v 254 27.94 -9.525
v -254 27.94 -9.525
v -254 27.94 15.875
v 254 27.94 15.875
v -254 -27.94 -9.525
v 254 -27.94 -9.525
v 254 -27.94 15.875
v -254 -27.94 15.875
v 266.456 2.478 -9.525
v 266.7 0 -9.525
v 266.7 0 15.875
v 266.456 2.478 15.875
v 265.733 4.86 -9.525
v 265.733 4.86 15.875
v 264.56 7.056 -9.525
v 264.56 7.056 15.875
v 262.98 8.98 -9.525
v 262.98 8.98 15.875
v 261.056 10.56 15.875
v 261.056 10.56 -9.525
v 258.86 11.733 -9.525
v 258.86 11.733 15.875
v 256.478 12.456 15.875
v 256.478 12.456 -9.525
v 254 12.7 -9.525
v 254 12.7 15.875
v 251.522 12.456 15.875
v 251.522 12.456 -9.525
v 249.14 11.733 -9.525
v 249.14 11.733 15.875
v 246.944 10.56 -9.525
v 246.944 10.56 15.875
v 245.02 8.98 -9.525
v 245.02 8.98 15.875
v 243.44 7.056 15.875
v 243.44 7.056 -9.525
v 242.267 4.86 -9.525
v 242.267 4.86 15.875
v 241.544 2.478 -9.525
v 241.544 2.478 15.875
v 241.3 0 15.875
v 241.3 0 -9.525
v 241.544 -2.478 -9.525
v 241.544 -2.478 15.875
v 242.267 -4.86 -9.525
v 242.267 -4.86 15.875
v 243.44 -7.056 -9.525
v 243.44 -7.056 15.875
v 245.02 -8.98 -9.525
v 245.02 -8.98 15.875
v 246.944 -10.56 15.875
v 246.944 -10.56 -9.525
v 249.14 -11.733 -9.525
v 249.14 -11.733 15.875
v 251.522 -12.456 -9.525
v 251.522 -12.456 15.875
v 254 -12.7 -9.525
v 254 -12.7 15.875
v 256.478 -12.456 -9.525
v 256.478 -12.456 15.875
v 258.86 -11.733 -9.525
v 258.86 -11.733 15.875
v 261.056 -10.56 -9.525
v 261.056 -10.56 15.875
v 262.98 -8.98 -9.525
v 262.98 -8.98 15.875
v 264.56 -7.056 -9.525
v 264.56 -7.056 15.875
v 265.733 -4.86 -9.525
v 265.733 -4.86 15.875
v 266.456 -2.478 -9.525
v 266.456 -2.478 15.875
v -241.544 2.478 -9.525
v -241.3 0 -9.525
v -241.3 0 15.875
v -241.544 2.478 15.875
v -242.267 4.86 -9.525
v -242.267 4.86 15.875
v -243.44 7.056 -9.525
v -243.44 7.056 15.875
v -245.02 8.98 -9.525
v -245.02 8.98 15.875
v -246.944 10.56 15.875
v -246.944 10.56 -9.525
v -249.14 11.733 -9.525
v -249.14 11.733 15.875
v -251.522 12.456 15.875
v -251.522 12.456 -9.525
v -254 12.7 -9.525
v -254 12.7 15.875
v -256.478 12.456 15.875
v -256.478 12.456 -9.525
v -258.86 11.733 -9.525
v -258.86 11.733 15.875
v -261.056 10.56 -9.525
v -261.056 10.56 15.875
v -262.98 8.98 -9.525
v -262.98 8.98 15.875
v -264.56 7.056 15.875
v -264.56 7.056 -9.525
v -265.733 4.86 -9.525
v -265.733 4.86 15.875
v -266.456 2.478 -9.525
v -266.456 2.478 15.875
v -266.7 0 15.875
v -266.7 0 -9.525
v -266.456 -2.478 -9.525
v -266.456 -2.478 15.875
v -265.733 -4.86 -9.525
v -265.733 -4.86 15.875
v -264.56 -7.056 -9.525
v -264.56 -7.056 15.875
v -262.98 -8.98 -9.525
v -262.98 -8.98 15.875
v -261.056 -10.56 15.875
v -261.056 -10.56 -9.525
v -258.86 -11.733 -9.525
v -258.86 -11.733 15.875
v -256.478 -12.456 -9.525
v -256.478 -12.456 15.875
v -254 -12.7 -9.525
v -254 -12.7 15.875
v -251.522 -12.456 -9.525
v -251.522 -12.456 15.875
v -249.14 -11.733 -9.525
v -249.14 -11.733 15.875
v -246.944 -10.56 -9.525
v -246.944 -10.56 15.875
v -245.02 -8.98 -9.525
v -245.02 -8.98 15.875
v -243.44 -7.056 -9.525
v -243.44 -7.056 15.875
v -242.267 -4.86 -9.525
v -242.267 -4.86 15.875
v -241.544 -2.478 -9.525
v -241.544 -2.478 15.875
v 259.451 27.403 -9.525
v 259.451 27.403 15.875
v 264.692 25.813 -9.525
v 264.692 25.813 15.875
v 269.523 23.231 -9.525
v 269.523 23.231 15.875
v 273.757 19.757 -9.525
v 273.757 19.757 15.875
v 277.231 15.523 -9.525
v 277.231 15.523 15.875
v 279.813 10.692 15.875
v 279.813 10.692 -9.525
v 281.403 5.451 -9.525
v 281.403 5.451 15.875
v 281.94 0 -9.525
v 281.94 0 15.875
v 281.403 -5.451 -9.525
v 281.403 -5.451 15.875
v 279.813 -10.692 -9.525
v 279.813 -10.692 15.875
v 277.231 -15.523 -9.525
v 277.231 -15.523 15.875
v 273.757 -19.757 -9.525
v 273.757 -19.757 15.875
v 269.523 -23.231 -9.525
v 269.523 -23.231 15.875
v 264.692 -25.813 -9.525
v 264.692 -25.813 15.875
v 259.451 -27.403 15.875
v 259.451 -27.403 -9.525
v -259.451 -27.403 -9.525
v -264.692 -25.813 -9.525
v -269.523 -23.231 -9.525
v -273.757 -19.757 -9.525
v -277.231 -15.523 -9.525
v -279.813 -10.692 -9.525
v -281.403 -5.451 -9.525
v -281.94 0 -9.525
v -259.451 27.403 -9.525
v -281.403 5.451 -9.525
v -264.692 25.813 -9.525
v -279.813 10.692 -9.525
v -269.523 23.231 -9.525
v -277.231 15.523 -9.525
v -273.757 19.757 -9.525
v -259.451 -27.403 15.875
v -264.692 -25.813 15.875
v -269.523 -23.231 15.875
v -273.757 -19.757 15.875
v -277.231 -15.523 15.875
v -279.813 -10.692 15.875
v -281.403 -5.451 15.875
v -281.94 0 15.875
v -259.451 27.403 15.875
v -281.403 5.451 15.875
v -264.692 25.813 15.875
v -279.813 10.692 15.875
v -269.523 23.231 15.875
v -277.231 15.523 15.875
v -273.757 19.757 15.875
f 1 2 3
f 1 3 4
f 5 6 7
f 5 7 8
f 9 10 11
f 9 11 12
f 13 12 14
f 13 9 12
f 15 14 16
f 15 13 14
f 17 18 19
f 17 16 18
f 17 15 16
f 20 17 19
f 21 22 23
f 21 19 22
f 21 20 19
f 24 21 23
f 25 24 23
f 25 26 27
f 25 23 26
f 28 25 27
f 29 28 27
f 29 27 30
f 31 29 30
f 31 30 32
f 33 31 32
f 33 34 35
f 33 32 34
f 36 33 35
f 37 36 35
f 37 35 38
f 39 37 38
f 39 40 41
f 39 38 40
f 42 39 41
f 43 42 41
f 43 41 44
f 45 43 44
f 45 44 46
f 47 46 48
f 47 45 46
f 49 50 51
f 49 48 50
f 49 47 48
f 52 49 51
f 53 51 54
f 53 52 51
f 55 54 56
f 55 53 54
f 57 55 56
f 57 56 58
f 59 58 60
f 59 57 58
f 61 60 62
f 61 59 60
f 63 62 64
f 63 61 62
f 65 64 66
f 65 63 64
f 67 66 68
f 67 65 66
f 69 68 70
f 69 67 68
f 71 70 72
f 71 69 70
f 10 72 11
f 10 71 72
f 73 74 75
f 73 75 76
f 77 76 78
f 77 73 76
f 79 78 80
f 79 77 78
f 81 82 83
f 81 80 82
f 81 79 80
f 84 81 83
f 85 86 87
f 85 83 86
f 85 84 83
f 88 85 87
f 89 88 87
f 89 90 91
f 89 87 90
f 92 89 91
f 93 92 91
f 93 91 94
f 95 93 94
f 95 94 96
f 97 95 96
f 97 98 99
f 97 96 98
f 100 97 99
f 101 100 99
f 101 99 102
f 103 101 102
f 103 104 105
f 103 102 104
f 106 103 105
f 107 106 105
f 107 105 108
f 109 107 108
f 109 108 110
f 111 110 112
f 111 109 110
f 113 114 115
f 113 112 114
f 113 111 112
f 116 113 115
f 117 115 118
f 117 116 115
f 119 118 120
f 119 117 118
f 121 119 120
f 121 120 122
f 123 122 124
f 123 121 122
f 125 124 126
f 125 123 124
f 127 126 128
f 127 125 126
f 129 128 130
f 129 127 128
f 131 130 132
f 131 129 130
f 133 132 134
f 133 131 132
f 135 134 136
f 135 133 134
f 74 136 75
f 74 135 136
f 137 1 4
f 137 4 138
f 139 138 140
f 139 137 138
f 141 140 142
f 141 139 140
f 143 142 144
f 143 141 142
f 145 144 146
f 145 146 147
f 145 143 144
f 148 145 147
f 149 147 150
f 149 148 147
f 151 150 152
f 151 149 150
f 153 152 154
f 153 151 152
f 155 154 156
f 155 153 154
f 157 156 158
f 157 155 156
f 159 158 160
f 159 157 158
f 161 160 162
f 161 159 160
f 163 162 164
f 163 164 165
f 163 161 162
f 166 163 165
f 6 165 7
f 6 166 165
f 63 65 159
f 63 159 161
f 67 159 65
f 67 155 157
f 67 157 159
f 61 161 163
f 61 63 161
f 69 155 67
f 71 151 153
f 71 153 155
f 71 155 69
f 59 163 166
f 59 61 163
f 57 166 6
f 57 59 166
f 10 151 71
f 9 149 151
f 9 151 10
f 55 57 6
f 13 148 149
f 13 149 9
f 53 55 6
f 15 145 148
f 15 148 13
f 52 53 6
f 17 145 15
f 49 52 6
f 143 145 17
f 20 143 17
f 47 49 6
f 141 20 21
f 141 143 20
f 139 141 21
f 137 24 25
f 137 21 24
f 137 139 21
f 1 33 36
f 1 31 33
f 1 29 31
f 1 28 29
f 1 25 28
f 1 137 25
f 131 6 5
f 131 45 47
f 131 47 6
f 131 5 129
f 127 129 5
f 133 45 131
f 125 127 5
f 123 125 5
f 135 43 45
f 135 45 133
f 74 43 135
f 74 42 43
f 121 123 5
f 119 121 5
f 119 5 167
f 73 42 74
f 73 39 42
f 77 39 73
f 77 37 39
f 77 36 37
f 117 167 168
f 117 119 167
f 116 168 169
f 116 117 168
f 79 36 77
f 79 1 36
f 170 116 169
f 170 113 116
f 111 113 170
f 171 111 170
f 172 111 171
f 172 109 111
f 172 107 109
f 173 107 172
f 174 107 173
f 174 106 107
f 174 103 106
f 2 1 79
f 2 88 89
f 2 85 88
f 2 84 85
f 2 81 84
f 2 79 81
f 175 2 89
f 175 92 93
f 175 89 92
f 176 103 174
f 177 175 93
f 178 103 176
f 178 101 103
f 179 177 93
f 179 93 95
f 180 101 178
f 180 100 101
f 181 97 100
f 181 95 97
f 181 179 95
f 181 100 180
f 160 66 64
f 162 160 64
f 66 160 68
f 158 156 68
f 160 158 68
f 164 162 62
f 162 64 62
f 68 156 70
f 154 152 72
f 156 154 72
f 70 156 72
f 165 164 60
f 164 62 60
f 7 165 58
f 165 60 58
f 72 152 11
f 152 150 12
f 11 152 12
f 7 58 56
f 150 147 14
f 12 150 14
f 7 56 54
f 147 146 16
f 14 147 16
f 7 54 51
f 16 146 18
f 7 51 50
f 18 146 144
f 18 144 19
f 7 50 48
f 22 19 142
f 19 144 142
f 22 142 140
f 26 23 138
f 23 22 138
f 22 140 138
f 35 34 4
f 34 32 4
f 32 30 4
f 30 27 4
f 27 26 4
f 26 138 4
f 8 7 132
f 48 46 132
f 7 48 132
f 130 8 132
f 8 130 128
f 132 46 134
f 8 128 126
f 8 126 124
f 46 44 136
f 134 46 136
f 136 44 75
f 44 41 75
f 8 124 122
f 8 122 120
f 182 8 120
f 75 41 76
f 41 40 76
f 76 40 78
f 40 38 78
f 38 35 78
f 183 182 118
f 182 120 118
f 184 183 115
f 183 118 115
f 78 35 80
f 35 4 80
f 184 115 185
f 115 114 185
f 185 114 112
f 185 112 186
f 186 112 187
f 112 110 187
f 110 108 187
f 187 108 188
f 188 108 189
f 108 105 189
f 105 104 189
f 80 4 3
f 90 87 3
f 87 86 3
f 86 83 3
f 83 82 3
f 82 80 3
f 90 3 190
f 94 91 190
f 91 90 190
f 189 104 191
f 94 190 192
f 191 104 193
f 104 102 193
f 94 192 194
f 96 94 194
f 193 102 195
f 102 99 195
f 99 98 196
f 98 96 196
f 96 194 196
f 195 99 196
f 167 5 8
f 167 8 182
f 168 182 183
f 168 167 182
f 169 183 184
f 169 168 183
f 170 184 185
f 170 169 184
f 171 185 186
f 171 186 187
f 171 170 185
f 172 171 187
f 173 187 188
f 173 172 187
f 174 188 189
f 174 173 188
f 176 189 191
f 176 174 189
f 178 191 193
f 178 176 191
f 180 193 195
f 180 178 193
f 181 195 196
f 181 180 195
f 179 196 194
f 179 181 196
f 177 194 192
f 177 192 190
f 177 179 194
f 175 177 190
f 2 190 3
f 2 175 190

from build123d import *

# Parameters (mm, degrees)
BOSS_EXTRUDE1_DEPTH     = 6.35
CUT_EXTRUDE1_DEPTH      = 72.114330131
CUT_EXTRUDE1_DEPTH_BACK = 72.114330131
SKETCH2_R               = 3.175
SCALE1_SCALE            = 4


with BuildPart() as part:
    # Sketch1 → Boss-Extrude1 (new body)
    with BuildSketch(Plane.XY):
        with BuildLine():
            Line((-63.5, 6.985), (63.5, 6.985))
            ThreePointArc((63.5, 6.985), (70.485, 0), (63.5, -6.985))
            Line((63.5, -6.985), (-63.5, -6.985))
            ThreePointArc((-63.5, -6.985), (-70.485, 0), (-63.5, 6.985))
        make_face()
    extrude(amount=BOSS_EXTRUDE1_DEPTH)

    # Sketch2 → Cut-Extrude1 (cut, two sides: drawn at the far end of the back side and taken through both)
    with BuildSketch(Plane.XY.offset(6.35).offset(-CUT_EXTRUDE1_DEPTH_BACK)):
        with Locations((63.5, 0)):
            Circle(SKETCH2_R)
        with Locations((-63.5, 0)):
            Circle(SKETCH2_R)
    extrude(amount=CUT_EXTRUDE1_DEPTH + CUT_EXTRUDE1_DEPTH_BACK, mode=Mode.SUBTRACT)


with BuildPart() as part_1:
    # Scale1: scaled about (0, 0, 3.175)
    add(part.part.scale(SCALE1_SCALE).moved(Location((0, 0, -9.525))))


solid = part_1.part
